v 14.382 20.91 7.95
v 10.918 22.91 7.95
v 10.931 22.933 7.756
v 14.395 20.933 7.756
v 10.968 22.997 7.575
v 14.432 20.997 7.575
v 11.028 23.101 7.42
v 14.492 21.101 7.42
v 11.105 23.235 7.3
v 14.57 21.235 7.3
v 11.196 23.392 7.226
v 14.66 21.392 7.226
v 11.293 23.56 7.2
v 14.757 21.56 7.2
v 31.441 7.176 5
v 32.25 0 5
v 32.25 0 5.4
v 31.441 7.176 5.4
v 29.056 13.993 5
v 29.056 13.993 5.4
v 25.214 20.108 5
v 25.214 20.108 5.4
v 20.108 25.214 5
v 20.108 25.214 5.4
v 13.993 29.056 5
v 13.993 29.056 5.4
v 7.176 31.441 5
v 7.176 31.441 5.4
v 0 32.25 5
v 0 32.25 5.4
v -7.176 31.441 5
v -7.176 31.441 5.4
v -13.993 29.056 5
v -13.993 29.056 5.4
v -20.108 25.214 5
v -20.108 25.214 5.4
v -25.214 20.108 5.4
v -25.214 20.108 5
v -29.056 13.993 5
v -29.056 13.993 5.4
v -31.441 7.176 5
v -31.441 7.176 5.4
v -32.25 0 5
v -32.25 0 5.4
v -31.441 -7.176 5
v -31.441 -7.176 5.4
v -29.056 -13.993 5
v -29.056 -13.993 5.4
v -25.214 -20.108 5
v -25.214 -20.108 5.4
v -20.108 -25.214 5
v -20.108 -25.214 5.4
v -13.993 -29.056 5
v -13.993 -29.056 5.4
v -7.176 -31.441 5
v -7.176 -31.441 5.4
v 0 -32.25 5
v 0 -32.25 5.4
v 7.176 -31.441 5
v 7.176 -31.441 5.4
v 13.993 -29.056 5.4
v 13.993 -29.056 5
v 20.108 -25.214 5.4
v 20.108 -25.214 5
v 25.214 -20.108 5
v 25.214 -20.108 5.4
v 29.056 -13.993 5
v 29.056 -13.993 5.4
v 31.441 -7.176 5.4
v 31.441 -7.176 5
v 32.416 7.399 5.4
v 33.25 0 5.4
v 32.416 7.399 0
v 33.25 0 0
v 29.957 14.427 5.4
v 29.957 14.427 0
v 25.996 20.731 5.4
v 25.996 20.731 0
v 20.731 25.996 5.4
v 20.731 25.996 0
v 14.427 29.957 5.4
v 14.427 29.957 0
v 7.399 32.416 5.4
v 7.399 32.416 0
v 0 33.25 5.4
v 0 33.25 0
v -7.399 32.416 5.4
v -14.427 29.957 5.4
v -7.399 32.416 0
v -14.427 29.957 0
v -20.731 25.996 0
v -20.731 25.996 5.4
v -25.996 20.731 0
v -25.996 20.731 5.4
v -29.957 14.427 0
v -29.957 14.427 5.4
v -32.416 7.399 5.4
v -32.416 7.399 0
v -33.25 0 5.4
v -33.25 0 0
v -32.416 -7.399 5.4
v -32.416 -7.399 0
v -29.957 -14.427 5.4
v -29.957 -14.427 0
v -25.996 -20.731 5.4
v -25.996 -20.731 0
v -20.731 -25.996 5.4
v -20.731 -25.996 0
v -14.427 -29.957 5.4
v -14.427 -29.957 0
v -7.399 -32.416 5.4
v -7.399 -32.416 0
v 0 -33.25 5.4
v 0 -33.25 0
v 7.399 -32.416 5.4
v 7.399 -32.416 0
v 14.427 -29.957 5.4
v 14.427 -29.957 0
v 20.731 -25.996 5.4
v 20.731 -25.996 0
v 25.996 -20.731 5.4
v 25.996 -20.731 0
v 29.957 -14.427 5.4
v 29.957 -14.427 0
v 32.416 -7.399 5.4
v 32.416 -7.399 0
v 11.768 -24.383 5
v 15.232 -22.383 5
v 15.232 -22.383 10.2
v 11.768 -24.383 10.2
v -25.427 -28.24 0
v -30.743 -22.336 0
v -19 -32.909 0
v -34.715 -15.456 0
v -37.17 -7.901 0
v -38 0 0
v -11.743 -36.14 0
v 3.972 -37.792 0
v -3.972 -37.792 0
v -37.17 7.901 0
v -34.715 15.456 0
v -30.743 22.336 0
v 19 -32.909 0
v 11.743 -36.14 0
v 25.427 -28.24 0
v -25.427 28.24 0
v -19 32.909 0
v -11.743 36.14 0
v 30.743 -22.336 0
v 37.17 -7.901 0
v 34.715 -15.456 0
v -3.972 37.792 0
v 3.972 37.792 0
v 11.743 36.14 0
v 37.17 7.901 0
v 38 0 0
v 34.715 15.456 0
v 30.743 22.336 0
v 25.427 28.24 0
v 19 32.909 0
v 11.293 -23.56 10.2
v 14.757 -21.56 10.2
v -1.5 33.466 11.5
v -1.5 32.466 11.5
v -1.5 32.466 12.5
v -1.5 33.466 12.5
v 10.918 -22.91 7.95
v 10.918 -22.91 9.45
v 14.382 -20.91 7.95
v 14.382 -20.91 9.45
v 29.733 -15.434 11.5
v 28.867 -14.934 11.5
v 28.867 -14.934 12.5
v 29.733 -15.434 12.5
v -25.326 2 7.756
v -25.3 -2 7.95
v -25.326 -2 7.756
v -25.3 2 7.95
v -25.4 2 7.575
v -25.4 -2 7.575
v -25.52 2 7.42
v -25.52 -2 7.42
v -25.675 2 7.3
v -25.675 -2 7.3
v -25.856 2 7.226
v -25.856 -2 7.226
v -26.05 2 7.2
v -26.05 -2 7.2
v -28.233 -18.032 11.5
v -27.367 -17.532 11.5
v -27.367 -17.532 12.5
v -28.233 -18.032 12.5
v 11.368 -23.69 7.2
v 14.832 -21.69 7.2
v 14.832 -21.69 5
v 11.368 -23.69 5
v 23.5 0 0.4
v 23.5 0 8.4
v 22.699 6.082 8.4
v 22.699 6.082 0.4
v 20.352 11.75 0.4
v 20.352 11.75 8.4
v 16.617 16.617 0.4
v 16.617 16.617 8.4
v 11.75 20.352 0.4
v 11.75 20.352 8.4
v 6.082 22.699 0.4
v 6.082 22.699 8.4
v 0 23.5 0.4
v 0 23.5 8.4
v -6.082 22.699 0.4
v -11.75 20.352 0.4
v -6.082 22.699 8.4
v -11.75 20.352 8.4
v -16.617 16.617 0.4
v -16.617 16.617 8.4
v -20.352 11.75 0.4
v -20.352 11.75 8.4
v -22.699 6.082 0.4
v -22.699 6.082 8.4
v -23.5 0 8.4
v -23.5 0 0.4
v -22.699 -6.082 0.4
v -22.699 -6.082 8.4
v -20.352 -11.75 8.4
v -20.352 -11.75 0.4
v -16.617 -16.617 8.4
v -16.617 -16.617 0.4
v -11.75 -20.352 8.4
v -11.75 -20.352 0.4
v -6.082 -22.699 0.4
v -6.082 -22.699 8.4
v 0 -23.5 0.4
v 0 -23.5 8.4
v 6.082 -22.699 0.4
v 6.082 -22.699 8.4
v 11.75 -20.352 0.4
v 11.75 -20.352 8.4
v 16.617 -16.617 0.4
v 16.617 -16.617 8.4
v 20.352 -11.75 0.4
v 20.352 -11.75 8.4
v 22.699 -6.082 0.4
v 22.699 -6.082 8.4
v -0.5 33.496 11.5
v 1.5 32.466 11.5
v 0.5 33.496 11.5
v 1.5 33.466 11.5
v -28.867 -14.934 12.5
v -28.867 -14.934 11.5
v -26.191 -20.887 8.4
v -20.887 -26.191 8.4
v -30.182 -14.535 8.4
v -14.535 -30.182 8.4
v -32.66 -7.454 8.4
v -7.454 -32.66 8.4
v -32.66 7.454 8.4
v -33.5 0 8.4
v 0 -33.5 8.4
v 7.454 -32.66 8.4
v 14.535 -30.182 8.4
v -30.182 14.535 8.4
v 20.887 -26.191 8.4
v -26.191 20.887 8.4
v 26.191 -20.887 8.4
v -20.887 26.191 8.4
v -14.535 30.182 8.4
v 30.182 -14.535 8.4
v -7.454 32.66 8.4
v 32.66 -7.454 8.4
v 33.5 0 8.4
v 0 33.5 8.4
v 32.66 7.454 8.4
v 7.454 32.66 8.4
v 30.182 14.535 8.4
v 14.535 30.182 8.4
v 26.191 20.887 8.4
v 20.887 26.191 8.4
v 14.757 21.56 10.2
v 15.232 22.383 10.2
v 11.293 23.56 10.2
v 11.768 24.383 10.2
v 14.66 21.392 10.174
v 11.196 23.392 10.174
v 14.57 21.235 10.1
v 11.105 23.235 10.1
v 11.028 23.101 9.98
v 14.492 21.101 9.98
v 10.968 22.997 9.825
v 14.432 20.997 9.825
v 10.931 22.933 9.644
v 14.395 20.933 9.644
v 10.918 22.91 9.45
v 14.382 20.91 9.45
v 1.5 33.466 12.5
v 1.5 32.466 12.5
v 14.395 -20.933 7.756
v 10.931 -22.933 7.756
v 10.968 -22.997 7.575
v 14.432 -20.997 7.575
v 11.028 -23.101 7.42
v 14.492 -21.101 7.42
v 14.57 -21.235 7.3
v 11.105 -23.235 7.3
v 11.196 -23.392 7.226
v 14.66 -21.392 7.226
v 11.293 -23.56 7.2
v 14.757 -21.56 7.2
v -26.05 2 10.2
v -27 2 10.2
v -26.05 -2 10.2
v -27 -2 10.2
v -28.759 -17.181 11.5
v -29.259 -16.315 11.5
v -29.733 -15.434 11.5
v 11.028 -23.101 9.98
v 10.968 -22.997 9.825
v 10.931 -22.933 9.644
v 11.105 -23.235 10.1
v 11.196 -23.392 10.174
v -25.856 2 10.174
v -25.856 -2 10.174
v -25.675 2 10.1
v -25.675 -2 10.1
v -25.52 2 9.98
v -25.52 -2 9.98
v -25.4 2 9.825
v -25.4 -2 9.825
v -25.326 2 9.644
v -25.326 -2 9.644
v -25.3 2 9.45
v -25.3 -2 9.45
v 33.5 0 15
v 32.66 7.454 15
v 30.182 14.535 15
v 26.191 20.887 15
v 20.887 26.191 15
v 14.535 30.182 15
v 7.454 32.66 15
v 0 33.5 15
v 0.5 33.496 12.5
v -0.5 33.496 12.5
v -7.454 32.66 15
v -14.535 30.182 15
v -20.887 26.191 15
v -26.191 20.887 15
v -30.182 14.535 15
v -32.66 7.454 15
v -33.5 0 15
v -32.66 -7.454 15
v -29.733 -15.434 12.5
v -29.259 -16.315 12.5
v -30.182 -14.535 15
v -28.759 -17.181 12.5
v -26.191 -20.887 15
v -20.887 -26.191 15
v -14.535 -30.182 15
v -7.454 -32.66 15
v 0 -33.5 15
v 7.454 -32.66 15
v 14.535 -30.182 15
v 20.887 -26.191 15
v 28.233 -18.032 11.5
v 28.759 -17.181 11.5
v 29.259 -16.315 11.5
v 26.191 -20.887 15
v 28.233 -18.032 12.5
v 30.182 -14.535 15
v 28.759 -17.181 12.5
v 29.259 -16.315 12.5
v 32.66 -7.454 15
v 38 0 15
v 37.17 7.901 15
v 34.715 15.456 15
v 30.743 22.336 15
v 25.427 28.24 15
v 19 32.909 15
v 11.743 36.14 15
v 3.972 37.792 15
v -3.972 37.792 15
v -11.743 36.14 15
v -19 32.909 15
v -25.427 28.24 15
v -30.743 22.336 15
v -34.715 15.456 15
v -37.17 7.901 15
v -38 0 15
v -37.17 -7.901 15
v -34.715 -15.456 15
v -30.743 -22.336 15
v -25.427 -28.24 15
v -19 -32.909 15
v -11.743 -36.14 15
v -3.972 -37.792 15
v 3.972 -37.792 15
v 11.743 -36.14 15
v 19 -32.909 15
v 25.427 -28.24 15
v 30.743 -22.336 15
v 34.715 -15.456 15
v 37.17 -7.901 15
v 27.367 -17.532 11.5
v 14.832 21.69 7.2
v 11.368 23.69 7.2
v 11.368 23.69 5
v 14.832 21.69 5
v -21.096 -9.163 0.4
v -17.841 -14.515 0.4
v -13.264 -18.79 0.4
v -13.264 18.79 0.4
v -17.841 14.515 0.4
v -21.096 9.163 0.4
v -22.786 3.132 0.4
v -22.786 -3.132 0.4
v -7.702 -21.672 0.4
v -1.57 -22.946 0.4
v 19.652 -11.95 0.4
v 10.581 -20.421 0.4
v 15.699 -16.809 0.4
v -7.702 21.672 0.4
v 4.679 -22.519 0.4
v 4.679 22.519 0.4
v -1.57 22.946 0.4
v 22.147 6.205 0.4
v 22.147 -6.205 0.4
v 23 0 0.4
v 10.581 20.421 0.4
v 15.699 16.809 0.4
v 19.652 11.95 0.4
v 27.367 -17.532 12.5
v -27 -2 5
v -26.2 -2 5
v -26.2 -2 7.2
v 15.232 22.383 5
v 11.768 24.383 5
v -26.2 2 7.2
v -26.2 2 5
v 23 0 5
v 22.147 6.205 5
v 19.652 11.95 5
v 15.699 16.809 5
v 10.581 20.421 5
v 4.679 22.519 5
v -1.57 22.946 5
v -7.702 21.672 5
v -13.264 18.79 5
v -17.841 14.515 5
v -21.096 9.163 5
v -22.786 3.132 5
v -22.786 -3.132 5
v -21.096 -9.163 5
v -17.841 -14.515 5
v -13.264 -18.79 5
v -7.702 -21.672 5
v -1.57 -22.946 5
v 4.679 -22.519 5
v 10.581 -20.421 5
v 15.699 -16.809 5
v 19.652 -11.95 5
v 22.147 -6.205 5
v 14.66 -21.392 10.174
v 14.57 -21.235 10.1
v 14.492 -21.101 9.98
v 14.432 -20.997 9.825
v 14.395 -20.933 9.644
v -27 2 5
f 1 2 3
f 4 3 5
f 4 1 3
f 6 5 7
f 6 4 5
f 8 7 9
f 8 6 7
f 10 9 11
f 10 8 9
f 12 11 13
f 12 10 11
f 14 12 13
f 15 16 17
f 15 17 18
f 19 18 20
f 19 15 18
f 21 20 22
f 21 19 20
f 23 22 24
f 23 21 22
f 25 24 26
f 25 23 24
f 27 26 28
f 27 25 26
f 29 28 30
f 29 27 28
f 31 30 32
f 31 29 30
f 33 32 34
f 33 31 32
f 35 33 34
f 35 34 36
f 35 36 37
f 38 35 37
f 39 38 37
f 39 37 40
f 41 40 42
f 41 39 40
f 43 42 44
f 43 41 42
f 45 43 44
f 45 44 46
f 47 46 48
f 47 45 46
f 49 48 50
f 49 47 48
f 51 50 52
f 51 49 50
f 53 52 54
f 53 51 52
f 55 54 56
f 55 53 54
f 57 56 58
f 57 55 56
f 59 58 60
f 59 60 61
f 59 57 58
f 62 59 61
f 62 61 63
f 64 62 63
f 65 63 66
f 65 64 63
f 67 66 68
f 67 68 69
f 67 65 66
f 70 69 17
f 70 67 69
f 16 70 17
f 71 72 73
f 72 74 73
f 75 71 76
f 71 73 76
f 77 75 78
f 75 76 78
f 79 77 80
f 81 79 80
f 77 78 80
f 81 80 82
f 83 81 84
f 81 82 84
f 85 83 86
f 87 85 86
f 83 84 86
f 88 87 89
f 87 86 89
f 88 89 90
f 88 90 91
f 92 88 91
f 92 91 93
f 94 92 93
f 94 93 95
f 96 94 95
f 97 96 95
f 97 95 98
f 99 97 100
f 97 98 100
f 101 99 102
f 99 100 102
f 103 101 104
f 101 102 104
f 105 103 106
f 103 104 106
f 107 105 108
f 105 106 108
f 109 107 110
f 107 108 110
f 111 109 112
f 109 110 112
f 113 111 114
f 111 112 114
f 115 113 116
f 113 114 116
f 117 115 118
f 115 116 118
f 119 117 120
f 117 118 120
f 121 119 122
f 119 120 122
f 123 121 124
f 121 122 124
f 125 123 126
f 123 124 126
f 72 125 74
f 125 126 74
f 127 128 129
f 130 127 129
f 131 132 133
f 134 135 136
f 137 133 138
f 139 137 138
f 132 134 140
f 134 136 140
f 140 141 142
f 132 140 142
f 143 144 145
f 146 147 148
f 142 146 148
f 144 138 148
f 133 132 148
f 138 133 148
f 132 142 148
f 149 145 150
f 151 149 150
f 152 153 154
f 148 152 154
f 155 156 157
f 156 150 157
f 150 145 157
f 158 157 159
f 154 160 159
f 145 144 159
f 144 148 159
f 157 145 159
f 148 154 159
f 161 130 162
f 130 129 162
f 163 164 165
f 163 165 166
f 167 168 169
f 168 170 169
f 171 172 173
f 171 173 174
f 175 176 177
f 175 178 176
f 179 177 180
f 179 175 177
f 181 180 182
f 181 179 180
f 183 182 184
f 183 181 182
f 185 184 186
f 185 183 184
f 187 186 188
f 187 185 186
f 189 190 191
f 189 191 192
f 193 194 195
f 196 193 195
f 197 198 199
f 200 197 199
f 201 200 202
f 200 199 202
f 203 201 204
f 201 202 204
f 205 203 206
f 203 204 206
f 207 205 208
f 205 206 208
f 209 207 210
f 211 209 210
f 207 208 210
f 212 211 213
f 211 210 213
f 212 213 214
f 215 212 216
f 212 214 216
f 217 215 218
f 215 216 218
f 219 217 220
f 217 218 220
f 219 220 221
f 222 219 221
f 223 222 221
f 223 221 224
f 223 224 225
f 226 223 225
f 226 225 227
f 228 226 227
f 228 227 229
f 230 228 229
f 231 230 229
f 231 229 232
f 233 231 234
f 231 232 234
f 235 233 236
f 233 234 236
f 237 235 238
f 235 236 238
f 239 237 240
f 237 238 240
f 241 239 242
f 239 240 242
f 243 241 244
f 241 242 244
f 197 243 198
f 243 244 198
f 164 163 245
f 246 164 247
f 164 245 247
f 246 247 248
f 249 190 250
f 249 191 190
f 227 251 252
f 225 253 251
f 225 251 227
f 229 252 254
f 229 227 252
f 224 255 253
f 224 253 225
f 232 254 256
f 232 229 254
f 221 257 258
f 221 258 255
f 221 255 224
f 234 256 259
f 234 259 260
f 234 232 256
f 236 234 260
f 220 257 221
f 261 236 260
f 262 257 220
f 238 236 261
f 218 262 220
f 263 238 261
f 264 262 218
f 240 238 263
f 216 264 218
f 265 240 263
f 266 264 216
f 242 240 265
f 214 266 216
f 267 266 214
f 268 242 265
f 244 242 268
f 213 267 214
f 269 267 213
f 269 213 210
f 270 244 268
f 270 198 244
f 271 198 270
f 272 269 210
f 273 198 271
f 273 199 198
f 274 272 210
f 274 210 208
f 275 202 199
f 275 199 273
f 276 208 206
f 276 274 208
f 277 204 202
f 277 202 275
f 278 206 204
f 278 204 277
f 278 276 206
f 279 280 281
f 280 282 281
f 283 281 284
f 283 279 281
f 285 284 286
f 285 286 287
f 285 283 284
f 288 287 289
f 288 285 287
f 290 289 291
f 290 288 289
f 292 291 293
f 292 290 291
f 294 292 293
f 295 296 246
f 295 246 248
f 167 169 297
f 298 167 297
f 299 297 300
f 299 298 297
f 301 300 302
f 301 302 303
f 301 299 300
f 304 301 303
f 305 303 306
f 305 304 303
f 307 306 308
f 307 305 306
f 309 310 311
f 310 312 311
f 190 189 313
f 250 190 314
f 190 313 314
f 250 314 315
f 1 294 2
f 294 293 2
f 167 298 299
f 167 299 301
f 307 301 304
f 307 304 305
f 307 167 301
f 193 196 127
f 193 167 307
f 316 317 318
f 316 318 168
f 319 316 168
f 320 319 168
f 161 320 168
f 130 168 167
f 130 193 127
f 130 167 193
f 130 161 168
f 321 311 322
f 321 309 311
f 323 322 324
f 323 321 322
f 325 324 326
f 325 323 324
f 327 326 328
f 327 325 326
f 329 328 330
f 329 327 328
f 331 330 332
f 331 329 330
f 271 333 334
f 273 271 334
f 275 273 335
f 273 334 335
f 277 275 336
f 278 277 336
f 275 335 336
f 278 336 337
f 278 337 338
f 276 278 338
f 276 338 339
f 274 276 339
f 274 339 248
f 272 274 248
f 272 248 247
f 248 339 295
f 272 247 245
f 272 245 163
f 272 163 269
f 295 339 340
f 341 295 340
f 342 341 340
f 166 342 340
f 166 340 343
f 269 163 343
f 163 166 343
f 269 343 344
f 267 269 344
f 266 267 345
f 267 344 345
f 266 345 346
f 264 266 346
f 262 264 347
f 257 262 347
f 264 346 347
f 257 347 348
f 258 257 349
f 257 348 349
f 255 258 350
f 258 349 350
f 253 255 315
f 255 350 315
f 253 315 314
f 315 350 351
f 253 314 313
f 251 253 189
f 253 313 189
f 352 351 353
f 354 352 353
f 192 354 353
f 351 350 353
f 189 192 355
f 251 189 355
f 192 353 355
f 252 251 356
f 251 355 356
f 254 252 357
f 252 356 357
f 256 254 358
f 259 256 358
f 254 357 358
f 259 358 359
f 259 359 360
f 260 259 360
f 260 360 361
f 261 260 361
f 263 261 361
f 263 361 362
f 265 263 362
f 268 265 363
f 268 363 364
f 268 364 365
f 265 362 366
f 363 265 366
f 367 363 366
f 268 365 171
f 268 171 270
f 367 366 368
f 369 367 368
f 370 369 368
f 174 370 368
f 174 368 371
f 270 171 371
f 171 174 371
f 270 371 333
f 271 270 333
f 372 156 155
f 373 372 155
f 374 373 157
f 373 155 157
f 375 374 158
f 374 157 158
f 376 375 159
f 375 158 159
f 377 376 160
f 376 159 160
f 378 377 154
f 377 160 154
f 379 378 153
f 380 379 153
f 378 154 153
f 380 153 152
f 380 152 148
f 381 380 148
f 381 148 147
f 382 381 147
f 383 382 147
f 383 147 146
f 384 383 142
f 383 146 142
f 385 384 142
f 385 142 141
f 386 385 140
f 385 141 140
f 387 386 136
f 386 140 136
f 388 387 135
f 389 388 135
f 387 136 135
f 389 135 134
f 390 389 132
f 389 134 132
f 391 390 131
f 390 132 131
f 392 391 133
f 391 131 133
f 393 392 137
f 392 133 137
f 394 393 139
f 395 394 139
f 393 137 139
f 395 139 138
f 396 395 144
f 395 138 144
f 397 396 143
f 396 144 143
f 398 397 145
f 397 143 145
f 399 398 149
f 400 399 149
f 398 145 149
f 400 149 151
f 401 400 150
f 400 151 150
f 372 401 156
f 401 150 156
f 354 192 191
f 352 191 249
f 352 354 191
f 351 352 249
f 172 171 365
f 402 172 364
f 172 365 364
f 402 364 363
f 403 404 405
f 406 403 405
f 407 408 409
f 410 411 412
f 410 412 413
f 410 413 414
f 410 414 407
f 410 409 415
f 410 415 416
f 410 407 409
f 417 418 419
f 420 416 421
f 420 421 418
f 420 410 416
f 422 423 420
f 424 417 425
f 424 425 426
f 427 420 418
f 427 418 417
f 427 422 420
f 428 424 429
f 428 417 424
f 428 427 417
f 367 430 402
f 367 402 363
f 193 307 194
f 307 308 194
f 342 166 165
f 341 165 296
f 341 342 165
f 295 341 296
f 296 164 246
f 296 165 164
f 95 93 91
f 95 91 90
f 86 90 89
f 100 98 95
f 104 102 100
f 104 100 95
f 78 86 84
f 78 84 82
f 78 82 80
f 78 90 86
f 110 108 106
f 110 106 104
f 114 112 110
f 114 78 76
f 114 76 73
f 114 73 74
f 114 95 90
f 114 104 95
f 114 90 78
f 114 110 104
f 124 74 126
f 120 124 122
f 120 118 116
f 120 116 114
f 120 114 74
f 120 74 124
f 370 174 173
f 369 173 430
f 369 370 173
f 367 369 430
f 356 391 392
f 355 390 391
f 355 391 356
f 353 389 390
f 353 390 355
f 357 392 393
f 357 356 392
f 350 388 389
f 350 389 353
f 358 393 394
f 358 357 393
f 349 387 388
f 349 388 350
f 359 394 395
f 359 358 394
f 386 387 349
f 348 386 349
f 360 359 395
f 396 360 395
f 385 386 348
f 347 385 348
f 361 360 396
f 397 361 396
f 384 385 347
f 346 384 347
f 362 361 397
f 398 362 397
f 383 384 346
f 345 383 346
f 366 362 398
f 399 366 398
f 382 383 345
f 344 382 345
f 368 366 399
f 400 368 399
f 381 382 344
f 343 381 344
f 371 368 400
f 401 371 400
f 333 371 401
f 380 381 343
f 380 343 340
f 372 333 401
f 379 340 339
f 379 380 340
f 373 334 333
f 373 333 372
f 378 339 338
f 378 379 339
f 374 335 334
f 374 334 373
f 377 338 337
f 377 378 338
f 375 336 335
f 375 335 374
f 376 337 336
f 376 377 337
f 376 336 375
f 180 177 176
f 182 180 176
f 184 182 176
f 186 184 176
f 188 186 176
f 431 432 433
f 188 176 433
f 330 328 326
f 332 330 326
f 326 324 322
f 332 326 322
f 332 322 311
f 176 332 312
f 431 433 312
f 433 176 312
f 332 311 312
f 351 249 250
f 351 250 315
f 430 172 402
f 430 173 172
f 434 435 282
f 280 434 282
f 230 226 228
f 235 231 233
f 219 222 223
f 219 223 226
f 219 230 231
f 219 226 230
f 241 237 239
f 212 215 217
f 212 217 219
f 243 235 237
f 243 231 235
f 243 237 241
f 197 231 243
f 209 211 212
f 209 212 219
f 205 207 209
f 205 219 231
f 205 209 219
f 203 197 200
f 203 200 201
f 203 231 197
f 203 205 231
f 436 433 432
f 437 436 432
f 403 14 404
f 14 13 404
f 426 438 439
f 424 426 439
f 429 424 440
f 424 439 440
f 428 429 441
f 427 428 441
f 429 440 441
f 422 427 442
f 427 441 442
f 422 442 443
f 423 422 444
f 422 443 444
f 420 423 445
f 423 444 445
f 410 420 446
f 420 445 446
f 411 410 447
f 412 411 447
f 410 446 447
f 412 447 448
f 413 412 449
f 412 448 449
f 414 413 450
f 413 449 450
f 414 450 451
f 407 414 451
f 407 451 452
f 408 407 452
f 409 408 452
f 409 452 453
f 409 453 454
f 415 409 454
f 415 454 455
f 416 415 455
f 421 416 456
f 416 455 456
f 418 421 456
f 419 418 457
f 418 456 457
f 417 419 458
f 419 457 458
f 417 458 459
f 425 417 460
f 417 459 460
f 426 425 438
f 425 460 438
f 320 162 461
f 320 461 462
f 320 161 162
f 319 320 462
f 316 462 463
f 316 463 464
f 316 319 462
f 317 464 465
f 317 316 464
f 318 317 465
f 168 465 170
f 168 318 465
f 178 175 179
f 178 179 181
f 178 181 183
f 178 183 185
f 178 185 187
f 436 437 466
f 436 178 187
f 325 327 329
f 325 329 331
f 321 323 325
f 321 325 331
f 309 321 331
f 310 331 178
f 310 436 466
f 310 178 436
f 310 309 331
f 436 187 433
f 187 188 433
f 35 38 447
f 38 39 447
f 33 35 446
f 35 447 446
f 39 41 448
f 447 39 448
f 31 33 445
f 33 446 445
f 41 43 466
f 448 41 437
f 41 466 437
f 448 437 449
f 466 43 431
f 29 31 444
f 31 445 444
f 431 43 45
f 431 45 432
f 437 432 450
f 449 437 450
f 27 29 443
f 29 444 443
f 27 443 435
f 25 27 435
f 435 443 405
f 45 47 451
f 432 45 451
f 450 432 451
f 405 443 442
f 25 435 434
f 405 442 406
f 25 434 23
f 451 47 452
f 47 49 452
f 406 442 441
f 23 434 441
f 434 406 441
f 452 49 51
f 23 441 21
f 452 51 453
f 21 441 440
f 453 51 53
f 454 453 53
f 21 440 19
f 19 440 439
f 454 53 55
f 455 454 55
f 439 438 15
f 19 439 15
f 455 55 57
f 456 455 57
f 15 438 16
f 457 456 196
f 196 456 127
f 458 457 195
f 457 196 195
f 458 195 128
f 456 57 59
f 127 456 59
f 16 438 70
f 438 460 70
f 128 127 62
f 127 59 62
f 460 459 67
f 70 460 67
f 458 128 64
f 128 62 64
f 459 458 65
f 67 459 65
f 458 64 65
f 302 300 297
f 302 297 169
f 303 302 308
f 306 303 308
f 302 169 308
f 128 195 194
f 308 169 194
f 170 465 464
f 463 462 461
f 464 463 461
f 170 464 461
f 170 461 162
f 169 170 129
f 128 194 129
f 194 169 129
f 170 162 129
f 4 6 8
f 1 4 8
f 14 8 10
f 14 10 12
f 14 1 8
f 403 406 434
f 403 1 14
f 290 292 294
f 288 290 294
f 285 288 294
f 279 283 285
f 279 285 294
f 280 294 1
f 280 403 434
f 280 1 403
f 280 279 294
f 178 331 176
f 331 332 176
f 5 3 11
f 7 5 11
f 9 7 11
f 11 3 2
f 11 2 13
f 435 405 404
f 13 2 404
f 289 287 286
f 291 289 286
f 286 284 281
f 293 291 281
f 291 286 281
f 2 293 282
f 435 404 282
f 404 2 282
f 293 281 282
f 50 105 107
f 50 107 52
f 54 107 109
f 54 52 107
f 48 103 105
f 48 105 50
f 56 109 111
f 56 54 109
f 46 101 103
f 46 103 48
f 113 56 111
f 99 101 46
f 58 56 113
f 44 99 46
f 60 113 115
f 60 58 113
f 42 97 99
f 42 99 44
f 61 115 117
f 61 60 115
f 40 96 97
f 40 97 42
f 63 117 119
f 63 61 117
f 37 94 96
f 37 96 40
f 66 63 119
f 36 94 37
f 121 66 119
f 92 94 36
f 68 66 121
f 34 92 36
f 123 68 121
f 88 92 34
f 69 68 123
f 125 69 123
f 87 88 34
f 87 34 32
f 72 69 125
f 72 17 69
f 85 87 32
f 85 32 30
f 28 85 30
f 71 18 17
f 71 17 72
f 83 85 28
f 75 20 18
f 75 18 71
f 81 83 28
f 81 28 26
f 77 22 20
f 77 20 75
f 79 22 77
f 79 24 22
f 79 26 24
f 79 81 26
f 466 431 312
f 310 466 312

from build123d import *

# Parameters (mm, degrees)
SKETCH_R              = 38
PAD_DEPTH             = 15
SKETCH001_R           = 33.5
POCKET_DEPTH          = 6.6
SKETCH002_R           = 23.5
POCKET001_DEPTH       = 8
PAD001_DEPTH          = 0.5
POLARPATTERN_COUNT    = 3
SKETCH004_R           = 27.25
PAD002_DEPTH          = 5
PAD003_DEPTH          = 2
POLARPATTERN001_COUNT = 3
SKETCH006_R           = 23
POCKET002_DEPTH       = 4.6
FILLET_R              = 0.75
SKETCH007_R           = 33.25
SKETCH007_R_2         = 27.25
PAD004_DEPTH          = 5
SKETCH008_R           = 33.25
SKETCH008_R_2         = 32.25
PAD005_DEPTH          = 0.4


with BuildPart() as lightcover:
    # Sketch → Pad (new body)
    with BuildSketch(Plane.XY):
        Circle(SKETCH_R)
    extrude(amount=PAD_DEPTH)

    # Sketch001 (on Face3 of Pad) → Pocket (cut)
    with BuildSketch(Plane.XY.offset(15)):
        Circle(SKETCH001_R)
    extrude(amount=-POCKET_DEPTH, mode=Mode.SUBTRACT)

    # Sketch002 (on Face5 of Pocket) → Pocket001 (cut)
    with BuildSketch(Plane.XY.offset(8.4)):
        Circle(SKETCH002_R)
    extrude(amount=-POCKET001_DEPTH, mode=Mode.SUBTRACT)

    # Sketch003 (on DatumPlane) → Pad001 (join, symmetric)
    with BuildSketch(Plane.XY.offset(12)):
        with BuildLine():
            Line((-1.5, 32.466401), (1.5, 32.466401))
            Line((1.5, 32.466401), (1.5, 33.466401))
            ThreePointArc((1.5, 33.466401), (0, 33.5), (-1.5, 33.466401))
            Line((-1.5, 32.466401), (-1.5, 33.466401))
        make_face()
    pad001 = extrude(amount=PAD001_DEPTH, both=True)

    # PolarPattern: Pad001 ×3 about axis
    polarpattern_axis = Axis((0, 0, 12), (0, 0, 1))
    for i in range(1, POLARPATTERN_COUNT):
        add(pad001.rotate(polarpattern_axis, i * 360 / POLARPATTERN_COUNT))


with BuildPart() as extracthoodlightcover:
    # Sketch004 → Pad002 (new body)
    with BuildSketch(Plane.XY):
        Circle(SKETCH004_R)
    extrude(amount=PAD002_DEPTH)

    # Sketch005 → Pad003 (join, symmetric)
    with BuildSketch(Plane.XZ):
        Polygon((-27, 5), (-27, 10.2), (-25.3, 10.2), (-25.3, 7.2), (-26.2, 7.2), (-26.2, 5), align=None)
    pad003 = extrude(amount=PAD003_DEPTH, both=True)

    # PolarPattern001: Pad003 ×3 about axis
    polarpattern001_axis = Axis((0, 0, 0), (0, 0, 1))
    for i in range(1, POLARPATTERN001_COUNT):
        add(pad003.rotate(polarpattern001_axis, i * 360 / POLARPATTERN001_COUNT))

    # Sketch006 → Pocket002 (cut)
    with BuildSketch(Plane.XY.offset(5)):
        Circle(SKETCH006_R)
    extrude(amount=-POCKET002_DEPTH, mode=Mode.SUBTRACT)

    # Fillet
    fillet_edges = [extracthoodlightcover.edges().sort_by_distance(p)[0] for p in [
        (-25.3, 0, 10.2),
        (-25.3, 0, 7.2),
        (12.65, 21.910443, 10.2),
        (12.65, 21.910443, 7.2),
        (12.65, -21.910443, 10.2),
        (12.65, -21.910443, 7.2),
    ]]
    fillet(fillet_edges, radius=FILLET_R)

    # Sketch007 (on Face21 of Fillet) → Pad004 (join)
    with BuildSketch(Plane(origin=(0, 0, 0), x_dir=(1, 0, 0), z_dir=(0, 0, -1))):
        Circle(SKETCH007_R)
        Circle(SKETCH007_R_2, mode=Mode.SUBTRACT)
    extrude(amount=-PAD004_DEPTH)

    # Sketch008 (on Face11 of Pad004) → Pad005 (join)
    with BuildSketch(Plane.XY.offset(5)):
        Circle(SKETCH008_R)
        Circle(SKETCH008_R_2, mode=Mode.SUBTRACT)
    extrude(amount=PAD005_DEPTH)


solid = Compound([lightcover.part, extracthoodlightcover.part])
